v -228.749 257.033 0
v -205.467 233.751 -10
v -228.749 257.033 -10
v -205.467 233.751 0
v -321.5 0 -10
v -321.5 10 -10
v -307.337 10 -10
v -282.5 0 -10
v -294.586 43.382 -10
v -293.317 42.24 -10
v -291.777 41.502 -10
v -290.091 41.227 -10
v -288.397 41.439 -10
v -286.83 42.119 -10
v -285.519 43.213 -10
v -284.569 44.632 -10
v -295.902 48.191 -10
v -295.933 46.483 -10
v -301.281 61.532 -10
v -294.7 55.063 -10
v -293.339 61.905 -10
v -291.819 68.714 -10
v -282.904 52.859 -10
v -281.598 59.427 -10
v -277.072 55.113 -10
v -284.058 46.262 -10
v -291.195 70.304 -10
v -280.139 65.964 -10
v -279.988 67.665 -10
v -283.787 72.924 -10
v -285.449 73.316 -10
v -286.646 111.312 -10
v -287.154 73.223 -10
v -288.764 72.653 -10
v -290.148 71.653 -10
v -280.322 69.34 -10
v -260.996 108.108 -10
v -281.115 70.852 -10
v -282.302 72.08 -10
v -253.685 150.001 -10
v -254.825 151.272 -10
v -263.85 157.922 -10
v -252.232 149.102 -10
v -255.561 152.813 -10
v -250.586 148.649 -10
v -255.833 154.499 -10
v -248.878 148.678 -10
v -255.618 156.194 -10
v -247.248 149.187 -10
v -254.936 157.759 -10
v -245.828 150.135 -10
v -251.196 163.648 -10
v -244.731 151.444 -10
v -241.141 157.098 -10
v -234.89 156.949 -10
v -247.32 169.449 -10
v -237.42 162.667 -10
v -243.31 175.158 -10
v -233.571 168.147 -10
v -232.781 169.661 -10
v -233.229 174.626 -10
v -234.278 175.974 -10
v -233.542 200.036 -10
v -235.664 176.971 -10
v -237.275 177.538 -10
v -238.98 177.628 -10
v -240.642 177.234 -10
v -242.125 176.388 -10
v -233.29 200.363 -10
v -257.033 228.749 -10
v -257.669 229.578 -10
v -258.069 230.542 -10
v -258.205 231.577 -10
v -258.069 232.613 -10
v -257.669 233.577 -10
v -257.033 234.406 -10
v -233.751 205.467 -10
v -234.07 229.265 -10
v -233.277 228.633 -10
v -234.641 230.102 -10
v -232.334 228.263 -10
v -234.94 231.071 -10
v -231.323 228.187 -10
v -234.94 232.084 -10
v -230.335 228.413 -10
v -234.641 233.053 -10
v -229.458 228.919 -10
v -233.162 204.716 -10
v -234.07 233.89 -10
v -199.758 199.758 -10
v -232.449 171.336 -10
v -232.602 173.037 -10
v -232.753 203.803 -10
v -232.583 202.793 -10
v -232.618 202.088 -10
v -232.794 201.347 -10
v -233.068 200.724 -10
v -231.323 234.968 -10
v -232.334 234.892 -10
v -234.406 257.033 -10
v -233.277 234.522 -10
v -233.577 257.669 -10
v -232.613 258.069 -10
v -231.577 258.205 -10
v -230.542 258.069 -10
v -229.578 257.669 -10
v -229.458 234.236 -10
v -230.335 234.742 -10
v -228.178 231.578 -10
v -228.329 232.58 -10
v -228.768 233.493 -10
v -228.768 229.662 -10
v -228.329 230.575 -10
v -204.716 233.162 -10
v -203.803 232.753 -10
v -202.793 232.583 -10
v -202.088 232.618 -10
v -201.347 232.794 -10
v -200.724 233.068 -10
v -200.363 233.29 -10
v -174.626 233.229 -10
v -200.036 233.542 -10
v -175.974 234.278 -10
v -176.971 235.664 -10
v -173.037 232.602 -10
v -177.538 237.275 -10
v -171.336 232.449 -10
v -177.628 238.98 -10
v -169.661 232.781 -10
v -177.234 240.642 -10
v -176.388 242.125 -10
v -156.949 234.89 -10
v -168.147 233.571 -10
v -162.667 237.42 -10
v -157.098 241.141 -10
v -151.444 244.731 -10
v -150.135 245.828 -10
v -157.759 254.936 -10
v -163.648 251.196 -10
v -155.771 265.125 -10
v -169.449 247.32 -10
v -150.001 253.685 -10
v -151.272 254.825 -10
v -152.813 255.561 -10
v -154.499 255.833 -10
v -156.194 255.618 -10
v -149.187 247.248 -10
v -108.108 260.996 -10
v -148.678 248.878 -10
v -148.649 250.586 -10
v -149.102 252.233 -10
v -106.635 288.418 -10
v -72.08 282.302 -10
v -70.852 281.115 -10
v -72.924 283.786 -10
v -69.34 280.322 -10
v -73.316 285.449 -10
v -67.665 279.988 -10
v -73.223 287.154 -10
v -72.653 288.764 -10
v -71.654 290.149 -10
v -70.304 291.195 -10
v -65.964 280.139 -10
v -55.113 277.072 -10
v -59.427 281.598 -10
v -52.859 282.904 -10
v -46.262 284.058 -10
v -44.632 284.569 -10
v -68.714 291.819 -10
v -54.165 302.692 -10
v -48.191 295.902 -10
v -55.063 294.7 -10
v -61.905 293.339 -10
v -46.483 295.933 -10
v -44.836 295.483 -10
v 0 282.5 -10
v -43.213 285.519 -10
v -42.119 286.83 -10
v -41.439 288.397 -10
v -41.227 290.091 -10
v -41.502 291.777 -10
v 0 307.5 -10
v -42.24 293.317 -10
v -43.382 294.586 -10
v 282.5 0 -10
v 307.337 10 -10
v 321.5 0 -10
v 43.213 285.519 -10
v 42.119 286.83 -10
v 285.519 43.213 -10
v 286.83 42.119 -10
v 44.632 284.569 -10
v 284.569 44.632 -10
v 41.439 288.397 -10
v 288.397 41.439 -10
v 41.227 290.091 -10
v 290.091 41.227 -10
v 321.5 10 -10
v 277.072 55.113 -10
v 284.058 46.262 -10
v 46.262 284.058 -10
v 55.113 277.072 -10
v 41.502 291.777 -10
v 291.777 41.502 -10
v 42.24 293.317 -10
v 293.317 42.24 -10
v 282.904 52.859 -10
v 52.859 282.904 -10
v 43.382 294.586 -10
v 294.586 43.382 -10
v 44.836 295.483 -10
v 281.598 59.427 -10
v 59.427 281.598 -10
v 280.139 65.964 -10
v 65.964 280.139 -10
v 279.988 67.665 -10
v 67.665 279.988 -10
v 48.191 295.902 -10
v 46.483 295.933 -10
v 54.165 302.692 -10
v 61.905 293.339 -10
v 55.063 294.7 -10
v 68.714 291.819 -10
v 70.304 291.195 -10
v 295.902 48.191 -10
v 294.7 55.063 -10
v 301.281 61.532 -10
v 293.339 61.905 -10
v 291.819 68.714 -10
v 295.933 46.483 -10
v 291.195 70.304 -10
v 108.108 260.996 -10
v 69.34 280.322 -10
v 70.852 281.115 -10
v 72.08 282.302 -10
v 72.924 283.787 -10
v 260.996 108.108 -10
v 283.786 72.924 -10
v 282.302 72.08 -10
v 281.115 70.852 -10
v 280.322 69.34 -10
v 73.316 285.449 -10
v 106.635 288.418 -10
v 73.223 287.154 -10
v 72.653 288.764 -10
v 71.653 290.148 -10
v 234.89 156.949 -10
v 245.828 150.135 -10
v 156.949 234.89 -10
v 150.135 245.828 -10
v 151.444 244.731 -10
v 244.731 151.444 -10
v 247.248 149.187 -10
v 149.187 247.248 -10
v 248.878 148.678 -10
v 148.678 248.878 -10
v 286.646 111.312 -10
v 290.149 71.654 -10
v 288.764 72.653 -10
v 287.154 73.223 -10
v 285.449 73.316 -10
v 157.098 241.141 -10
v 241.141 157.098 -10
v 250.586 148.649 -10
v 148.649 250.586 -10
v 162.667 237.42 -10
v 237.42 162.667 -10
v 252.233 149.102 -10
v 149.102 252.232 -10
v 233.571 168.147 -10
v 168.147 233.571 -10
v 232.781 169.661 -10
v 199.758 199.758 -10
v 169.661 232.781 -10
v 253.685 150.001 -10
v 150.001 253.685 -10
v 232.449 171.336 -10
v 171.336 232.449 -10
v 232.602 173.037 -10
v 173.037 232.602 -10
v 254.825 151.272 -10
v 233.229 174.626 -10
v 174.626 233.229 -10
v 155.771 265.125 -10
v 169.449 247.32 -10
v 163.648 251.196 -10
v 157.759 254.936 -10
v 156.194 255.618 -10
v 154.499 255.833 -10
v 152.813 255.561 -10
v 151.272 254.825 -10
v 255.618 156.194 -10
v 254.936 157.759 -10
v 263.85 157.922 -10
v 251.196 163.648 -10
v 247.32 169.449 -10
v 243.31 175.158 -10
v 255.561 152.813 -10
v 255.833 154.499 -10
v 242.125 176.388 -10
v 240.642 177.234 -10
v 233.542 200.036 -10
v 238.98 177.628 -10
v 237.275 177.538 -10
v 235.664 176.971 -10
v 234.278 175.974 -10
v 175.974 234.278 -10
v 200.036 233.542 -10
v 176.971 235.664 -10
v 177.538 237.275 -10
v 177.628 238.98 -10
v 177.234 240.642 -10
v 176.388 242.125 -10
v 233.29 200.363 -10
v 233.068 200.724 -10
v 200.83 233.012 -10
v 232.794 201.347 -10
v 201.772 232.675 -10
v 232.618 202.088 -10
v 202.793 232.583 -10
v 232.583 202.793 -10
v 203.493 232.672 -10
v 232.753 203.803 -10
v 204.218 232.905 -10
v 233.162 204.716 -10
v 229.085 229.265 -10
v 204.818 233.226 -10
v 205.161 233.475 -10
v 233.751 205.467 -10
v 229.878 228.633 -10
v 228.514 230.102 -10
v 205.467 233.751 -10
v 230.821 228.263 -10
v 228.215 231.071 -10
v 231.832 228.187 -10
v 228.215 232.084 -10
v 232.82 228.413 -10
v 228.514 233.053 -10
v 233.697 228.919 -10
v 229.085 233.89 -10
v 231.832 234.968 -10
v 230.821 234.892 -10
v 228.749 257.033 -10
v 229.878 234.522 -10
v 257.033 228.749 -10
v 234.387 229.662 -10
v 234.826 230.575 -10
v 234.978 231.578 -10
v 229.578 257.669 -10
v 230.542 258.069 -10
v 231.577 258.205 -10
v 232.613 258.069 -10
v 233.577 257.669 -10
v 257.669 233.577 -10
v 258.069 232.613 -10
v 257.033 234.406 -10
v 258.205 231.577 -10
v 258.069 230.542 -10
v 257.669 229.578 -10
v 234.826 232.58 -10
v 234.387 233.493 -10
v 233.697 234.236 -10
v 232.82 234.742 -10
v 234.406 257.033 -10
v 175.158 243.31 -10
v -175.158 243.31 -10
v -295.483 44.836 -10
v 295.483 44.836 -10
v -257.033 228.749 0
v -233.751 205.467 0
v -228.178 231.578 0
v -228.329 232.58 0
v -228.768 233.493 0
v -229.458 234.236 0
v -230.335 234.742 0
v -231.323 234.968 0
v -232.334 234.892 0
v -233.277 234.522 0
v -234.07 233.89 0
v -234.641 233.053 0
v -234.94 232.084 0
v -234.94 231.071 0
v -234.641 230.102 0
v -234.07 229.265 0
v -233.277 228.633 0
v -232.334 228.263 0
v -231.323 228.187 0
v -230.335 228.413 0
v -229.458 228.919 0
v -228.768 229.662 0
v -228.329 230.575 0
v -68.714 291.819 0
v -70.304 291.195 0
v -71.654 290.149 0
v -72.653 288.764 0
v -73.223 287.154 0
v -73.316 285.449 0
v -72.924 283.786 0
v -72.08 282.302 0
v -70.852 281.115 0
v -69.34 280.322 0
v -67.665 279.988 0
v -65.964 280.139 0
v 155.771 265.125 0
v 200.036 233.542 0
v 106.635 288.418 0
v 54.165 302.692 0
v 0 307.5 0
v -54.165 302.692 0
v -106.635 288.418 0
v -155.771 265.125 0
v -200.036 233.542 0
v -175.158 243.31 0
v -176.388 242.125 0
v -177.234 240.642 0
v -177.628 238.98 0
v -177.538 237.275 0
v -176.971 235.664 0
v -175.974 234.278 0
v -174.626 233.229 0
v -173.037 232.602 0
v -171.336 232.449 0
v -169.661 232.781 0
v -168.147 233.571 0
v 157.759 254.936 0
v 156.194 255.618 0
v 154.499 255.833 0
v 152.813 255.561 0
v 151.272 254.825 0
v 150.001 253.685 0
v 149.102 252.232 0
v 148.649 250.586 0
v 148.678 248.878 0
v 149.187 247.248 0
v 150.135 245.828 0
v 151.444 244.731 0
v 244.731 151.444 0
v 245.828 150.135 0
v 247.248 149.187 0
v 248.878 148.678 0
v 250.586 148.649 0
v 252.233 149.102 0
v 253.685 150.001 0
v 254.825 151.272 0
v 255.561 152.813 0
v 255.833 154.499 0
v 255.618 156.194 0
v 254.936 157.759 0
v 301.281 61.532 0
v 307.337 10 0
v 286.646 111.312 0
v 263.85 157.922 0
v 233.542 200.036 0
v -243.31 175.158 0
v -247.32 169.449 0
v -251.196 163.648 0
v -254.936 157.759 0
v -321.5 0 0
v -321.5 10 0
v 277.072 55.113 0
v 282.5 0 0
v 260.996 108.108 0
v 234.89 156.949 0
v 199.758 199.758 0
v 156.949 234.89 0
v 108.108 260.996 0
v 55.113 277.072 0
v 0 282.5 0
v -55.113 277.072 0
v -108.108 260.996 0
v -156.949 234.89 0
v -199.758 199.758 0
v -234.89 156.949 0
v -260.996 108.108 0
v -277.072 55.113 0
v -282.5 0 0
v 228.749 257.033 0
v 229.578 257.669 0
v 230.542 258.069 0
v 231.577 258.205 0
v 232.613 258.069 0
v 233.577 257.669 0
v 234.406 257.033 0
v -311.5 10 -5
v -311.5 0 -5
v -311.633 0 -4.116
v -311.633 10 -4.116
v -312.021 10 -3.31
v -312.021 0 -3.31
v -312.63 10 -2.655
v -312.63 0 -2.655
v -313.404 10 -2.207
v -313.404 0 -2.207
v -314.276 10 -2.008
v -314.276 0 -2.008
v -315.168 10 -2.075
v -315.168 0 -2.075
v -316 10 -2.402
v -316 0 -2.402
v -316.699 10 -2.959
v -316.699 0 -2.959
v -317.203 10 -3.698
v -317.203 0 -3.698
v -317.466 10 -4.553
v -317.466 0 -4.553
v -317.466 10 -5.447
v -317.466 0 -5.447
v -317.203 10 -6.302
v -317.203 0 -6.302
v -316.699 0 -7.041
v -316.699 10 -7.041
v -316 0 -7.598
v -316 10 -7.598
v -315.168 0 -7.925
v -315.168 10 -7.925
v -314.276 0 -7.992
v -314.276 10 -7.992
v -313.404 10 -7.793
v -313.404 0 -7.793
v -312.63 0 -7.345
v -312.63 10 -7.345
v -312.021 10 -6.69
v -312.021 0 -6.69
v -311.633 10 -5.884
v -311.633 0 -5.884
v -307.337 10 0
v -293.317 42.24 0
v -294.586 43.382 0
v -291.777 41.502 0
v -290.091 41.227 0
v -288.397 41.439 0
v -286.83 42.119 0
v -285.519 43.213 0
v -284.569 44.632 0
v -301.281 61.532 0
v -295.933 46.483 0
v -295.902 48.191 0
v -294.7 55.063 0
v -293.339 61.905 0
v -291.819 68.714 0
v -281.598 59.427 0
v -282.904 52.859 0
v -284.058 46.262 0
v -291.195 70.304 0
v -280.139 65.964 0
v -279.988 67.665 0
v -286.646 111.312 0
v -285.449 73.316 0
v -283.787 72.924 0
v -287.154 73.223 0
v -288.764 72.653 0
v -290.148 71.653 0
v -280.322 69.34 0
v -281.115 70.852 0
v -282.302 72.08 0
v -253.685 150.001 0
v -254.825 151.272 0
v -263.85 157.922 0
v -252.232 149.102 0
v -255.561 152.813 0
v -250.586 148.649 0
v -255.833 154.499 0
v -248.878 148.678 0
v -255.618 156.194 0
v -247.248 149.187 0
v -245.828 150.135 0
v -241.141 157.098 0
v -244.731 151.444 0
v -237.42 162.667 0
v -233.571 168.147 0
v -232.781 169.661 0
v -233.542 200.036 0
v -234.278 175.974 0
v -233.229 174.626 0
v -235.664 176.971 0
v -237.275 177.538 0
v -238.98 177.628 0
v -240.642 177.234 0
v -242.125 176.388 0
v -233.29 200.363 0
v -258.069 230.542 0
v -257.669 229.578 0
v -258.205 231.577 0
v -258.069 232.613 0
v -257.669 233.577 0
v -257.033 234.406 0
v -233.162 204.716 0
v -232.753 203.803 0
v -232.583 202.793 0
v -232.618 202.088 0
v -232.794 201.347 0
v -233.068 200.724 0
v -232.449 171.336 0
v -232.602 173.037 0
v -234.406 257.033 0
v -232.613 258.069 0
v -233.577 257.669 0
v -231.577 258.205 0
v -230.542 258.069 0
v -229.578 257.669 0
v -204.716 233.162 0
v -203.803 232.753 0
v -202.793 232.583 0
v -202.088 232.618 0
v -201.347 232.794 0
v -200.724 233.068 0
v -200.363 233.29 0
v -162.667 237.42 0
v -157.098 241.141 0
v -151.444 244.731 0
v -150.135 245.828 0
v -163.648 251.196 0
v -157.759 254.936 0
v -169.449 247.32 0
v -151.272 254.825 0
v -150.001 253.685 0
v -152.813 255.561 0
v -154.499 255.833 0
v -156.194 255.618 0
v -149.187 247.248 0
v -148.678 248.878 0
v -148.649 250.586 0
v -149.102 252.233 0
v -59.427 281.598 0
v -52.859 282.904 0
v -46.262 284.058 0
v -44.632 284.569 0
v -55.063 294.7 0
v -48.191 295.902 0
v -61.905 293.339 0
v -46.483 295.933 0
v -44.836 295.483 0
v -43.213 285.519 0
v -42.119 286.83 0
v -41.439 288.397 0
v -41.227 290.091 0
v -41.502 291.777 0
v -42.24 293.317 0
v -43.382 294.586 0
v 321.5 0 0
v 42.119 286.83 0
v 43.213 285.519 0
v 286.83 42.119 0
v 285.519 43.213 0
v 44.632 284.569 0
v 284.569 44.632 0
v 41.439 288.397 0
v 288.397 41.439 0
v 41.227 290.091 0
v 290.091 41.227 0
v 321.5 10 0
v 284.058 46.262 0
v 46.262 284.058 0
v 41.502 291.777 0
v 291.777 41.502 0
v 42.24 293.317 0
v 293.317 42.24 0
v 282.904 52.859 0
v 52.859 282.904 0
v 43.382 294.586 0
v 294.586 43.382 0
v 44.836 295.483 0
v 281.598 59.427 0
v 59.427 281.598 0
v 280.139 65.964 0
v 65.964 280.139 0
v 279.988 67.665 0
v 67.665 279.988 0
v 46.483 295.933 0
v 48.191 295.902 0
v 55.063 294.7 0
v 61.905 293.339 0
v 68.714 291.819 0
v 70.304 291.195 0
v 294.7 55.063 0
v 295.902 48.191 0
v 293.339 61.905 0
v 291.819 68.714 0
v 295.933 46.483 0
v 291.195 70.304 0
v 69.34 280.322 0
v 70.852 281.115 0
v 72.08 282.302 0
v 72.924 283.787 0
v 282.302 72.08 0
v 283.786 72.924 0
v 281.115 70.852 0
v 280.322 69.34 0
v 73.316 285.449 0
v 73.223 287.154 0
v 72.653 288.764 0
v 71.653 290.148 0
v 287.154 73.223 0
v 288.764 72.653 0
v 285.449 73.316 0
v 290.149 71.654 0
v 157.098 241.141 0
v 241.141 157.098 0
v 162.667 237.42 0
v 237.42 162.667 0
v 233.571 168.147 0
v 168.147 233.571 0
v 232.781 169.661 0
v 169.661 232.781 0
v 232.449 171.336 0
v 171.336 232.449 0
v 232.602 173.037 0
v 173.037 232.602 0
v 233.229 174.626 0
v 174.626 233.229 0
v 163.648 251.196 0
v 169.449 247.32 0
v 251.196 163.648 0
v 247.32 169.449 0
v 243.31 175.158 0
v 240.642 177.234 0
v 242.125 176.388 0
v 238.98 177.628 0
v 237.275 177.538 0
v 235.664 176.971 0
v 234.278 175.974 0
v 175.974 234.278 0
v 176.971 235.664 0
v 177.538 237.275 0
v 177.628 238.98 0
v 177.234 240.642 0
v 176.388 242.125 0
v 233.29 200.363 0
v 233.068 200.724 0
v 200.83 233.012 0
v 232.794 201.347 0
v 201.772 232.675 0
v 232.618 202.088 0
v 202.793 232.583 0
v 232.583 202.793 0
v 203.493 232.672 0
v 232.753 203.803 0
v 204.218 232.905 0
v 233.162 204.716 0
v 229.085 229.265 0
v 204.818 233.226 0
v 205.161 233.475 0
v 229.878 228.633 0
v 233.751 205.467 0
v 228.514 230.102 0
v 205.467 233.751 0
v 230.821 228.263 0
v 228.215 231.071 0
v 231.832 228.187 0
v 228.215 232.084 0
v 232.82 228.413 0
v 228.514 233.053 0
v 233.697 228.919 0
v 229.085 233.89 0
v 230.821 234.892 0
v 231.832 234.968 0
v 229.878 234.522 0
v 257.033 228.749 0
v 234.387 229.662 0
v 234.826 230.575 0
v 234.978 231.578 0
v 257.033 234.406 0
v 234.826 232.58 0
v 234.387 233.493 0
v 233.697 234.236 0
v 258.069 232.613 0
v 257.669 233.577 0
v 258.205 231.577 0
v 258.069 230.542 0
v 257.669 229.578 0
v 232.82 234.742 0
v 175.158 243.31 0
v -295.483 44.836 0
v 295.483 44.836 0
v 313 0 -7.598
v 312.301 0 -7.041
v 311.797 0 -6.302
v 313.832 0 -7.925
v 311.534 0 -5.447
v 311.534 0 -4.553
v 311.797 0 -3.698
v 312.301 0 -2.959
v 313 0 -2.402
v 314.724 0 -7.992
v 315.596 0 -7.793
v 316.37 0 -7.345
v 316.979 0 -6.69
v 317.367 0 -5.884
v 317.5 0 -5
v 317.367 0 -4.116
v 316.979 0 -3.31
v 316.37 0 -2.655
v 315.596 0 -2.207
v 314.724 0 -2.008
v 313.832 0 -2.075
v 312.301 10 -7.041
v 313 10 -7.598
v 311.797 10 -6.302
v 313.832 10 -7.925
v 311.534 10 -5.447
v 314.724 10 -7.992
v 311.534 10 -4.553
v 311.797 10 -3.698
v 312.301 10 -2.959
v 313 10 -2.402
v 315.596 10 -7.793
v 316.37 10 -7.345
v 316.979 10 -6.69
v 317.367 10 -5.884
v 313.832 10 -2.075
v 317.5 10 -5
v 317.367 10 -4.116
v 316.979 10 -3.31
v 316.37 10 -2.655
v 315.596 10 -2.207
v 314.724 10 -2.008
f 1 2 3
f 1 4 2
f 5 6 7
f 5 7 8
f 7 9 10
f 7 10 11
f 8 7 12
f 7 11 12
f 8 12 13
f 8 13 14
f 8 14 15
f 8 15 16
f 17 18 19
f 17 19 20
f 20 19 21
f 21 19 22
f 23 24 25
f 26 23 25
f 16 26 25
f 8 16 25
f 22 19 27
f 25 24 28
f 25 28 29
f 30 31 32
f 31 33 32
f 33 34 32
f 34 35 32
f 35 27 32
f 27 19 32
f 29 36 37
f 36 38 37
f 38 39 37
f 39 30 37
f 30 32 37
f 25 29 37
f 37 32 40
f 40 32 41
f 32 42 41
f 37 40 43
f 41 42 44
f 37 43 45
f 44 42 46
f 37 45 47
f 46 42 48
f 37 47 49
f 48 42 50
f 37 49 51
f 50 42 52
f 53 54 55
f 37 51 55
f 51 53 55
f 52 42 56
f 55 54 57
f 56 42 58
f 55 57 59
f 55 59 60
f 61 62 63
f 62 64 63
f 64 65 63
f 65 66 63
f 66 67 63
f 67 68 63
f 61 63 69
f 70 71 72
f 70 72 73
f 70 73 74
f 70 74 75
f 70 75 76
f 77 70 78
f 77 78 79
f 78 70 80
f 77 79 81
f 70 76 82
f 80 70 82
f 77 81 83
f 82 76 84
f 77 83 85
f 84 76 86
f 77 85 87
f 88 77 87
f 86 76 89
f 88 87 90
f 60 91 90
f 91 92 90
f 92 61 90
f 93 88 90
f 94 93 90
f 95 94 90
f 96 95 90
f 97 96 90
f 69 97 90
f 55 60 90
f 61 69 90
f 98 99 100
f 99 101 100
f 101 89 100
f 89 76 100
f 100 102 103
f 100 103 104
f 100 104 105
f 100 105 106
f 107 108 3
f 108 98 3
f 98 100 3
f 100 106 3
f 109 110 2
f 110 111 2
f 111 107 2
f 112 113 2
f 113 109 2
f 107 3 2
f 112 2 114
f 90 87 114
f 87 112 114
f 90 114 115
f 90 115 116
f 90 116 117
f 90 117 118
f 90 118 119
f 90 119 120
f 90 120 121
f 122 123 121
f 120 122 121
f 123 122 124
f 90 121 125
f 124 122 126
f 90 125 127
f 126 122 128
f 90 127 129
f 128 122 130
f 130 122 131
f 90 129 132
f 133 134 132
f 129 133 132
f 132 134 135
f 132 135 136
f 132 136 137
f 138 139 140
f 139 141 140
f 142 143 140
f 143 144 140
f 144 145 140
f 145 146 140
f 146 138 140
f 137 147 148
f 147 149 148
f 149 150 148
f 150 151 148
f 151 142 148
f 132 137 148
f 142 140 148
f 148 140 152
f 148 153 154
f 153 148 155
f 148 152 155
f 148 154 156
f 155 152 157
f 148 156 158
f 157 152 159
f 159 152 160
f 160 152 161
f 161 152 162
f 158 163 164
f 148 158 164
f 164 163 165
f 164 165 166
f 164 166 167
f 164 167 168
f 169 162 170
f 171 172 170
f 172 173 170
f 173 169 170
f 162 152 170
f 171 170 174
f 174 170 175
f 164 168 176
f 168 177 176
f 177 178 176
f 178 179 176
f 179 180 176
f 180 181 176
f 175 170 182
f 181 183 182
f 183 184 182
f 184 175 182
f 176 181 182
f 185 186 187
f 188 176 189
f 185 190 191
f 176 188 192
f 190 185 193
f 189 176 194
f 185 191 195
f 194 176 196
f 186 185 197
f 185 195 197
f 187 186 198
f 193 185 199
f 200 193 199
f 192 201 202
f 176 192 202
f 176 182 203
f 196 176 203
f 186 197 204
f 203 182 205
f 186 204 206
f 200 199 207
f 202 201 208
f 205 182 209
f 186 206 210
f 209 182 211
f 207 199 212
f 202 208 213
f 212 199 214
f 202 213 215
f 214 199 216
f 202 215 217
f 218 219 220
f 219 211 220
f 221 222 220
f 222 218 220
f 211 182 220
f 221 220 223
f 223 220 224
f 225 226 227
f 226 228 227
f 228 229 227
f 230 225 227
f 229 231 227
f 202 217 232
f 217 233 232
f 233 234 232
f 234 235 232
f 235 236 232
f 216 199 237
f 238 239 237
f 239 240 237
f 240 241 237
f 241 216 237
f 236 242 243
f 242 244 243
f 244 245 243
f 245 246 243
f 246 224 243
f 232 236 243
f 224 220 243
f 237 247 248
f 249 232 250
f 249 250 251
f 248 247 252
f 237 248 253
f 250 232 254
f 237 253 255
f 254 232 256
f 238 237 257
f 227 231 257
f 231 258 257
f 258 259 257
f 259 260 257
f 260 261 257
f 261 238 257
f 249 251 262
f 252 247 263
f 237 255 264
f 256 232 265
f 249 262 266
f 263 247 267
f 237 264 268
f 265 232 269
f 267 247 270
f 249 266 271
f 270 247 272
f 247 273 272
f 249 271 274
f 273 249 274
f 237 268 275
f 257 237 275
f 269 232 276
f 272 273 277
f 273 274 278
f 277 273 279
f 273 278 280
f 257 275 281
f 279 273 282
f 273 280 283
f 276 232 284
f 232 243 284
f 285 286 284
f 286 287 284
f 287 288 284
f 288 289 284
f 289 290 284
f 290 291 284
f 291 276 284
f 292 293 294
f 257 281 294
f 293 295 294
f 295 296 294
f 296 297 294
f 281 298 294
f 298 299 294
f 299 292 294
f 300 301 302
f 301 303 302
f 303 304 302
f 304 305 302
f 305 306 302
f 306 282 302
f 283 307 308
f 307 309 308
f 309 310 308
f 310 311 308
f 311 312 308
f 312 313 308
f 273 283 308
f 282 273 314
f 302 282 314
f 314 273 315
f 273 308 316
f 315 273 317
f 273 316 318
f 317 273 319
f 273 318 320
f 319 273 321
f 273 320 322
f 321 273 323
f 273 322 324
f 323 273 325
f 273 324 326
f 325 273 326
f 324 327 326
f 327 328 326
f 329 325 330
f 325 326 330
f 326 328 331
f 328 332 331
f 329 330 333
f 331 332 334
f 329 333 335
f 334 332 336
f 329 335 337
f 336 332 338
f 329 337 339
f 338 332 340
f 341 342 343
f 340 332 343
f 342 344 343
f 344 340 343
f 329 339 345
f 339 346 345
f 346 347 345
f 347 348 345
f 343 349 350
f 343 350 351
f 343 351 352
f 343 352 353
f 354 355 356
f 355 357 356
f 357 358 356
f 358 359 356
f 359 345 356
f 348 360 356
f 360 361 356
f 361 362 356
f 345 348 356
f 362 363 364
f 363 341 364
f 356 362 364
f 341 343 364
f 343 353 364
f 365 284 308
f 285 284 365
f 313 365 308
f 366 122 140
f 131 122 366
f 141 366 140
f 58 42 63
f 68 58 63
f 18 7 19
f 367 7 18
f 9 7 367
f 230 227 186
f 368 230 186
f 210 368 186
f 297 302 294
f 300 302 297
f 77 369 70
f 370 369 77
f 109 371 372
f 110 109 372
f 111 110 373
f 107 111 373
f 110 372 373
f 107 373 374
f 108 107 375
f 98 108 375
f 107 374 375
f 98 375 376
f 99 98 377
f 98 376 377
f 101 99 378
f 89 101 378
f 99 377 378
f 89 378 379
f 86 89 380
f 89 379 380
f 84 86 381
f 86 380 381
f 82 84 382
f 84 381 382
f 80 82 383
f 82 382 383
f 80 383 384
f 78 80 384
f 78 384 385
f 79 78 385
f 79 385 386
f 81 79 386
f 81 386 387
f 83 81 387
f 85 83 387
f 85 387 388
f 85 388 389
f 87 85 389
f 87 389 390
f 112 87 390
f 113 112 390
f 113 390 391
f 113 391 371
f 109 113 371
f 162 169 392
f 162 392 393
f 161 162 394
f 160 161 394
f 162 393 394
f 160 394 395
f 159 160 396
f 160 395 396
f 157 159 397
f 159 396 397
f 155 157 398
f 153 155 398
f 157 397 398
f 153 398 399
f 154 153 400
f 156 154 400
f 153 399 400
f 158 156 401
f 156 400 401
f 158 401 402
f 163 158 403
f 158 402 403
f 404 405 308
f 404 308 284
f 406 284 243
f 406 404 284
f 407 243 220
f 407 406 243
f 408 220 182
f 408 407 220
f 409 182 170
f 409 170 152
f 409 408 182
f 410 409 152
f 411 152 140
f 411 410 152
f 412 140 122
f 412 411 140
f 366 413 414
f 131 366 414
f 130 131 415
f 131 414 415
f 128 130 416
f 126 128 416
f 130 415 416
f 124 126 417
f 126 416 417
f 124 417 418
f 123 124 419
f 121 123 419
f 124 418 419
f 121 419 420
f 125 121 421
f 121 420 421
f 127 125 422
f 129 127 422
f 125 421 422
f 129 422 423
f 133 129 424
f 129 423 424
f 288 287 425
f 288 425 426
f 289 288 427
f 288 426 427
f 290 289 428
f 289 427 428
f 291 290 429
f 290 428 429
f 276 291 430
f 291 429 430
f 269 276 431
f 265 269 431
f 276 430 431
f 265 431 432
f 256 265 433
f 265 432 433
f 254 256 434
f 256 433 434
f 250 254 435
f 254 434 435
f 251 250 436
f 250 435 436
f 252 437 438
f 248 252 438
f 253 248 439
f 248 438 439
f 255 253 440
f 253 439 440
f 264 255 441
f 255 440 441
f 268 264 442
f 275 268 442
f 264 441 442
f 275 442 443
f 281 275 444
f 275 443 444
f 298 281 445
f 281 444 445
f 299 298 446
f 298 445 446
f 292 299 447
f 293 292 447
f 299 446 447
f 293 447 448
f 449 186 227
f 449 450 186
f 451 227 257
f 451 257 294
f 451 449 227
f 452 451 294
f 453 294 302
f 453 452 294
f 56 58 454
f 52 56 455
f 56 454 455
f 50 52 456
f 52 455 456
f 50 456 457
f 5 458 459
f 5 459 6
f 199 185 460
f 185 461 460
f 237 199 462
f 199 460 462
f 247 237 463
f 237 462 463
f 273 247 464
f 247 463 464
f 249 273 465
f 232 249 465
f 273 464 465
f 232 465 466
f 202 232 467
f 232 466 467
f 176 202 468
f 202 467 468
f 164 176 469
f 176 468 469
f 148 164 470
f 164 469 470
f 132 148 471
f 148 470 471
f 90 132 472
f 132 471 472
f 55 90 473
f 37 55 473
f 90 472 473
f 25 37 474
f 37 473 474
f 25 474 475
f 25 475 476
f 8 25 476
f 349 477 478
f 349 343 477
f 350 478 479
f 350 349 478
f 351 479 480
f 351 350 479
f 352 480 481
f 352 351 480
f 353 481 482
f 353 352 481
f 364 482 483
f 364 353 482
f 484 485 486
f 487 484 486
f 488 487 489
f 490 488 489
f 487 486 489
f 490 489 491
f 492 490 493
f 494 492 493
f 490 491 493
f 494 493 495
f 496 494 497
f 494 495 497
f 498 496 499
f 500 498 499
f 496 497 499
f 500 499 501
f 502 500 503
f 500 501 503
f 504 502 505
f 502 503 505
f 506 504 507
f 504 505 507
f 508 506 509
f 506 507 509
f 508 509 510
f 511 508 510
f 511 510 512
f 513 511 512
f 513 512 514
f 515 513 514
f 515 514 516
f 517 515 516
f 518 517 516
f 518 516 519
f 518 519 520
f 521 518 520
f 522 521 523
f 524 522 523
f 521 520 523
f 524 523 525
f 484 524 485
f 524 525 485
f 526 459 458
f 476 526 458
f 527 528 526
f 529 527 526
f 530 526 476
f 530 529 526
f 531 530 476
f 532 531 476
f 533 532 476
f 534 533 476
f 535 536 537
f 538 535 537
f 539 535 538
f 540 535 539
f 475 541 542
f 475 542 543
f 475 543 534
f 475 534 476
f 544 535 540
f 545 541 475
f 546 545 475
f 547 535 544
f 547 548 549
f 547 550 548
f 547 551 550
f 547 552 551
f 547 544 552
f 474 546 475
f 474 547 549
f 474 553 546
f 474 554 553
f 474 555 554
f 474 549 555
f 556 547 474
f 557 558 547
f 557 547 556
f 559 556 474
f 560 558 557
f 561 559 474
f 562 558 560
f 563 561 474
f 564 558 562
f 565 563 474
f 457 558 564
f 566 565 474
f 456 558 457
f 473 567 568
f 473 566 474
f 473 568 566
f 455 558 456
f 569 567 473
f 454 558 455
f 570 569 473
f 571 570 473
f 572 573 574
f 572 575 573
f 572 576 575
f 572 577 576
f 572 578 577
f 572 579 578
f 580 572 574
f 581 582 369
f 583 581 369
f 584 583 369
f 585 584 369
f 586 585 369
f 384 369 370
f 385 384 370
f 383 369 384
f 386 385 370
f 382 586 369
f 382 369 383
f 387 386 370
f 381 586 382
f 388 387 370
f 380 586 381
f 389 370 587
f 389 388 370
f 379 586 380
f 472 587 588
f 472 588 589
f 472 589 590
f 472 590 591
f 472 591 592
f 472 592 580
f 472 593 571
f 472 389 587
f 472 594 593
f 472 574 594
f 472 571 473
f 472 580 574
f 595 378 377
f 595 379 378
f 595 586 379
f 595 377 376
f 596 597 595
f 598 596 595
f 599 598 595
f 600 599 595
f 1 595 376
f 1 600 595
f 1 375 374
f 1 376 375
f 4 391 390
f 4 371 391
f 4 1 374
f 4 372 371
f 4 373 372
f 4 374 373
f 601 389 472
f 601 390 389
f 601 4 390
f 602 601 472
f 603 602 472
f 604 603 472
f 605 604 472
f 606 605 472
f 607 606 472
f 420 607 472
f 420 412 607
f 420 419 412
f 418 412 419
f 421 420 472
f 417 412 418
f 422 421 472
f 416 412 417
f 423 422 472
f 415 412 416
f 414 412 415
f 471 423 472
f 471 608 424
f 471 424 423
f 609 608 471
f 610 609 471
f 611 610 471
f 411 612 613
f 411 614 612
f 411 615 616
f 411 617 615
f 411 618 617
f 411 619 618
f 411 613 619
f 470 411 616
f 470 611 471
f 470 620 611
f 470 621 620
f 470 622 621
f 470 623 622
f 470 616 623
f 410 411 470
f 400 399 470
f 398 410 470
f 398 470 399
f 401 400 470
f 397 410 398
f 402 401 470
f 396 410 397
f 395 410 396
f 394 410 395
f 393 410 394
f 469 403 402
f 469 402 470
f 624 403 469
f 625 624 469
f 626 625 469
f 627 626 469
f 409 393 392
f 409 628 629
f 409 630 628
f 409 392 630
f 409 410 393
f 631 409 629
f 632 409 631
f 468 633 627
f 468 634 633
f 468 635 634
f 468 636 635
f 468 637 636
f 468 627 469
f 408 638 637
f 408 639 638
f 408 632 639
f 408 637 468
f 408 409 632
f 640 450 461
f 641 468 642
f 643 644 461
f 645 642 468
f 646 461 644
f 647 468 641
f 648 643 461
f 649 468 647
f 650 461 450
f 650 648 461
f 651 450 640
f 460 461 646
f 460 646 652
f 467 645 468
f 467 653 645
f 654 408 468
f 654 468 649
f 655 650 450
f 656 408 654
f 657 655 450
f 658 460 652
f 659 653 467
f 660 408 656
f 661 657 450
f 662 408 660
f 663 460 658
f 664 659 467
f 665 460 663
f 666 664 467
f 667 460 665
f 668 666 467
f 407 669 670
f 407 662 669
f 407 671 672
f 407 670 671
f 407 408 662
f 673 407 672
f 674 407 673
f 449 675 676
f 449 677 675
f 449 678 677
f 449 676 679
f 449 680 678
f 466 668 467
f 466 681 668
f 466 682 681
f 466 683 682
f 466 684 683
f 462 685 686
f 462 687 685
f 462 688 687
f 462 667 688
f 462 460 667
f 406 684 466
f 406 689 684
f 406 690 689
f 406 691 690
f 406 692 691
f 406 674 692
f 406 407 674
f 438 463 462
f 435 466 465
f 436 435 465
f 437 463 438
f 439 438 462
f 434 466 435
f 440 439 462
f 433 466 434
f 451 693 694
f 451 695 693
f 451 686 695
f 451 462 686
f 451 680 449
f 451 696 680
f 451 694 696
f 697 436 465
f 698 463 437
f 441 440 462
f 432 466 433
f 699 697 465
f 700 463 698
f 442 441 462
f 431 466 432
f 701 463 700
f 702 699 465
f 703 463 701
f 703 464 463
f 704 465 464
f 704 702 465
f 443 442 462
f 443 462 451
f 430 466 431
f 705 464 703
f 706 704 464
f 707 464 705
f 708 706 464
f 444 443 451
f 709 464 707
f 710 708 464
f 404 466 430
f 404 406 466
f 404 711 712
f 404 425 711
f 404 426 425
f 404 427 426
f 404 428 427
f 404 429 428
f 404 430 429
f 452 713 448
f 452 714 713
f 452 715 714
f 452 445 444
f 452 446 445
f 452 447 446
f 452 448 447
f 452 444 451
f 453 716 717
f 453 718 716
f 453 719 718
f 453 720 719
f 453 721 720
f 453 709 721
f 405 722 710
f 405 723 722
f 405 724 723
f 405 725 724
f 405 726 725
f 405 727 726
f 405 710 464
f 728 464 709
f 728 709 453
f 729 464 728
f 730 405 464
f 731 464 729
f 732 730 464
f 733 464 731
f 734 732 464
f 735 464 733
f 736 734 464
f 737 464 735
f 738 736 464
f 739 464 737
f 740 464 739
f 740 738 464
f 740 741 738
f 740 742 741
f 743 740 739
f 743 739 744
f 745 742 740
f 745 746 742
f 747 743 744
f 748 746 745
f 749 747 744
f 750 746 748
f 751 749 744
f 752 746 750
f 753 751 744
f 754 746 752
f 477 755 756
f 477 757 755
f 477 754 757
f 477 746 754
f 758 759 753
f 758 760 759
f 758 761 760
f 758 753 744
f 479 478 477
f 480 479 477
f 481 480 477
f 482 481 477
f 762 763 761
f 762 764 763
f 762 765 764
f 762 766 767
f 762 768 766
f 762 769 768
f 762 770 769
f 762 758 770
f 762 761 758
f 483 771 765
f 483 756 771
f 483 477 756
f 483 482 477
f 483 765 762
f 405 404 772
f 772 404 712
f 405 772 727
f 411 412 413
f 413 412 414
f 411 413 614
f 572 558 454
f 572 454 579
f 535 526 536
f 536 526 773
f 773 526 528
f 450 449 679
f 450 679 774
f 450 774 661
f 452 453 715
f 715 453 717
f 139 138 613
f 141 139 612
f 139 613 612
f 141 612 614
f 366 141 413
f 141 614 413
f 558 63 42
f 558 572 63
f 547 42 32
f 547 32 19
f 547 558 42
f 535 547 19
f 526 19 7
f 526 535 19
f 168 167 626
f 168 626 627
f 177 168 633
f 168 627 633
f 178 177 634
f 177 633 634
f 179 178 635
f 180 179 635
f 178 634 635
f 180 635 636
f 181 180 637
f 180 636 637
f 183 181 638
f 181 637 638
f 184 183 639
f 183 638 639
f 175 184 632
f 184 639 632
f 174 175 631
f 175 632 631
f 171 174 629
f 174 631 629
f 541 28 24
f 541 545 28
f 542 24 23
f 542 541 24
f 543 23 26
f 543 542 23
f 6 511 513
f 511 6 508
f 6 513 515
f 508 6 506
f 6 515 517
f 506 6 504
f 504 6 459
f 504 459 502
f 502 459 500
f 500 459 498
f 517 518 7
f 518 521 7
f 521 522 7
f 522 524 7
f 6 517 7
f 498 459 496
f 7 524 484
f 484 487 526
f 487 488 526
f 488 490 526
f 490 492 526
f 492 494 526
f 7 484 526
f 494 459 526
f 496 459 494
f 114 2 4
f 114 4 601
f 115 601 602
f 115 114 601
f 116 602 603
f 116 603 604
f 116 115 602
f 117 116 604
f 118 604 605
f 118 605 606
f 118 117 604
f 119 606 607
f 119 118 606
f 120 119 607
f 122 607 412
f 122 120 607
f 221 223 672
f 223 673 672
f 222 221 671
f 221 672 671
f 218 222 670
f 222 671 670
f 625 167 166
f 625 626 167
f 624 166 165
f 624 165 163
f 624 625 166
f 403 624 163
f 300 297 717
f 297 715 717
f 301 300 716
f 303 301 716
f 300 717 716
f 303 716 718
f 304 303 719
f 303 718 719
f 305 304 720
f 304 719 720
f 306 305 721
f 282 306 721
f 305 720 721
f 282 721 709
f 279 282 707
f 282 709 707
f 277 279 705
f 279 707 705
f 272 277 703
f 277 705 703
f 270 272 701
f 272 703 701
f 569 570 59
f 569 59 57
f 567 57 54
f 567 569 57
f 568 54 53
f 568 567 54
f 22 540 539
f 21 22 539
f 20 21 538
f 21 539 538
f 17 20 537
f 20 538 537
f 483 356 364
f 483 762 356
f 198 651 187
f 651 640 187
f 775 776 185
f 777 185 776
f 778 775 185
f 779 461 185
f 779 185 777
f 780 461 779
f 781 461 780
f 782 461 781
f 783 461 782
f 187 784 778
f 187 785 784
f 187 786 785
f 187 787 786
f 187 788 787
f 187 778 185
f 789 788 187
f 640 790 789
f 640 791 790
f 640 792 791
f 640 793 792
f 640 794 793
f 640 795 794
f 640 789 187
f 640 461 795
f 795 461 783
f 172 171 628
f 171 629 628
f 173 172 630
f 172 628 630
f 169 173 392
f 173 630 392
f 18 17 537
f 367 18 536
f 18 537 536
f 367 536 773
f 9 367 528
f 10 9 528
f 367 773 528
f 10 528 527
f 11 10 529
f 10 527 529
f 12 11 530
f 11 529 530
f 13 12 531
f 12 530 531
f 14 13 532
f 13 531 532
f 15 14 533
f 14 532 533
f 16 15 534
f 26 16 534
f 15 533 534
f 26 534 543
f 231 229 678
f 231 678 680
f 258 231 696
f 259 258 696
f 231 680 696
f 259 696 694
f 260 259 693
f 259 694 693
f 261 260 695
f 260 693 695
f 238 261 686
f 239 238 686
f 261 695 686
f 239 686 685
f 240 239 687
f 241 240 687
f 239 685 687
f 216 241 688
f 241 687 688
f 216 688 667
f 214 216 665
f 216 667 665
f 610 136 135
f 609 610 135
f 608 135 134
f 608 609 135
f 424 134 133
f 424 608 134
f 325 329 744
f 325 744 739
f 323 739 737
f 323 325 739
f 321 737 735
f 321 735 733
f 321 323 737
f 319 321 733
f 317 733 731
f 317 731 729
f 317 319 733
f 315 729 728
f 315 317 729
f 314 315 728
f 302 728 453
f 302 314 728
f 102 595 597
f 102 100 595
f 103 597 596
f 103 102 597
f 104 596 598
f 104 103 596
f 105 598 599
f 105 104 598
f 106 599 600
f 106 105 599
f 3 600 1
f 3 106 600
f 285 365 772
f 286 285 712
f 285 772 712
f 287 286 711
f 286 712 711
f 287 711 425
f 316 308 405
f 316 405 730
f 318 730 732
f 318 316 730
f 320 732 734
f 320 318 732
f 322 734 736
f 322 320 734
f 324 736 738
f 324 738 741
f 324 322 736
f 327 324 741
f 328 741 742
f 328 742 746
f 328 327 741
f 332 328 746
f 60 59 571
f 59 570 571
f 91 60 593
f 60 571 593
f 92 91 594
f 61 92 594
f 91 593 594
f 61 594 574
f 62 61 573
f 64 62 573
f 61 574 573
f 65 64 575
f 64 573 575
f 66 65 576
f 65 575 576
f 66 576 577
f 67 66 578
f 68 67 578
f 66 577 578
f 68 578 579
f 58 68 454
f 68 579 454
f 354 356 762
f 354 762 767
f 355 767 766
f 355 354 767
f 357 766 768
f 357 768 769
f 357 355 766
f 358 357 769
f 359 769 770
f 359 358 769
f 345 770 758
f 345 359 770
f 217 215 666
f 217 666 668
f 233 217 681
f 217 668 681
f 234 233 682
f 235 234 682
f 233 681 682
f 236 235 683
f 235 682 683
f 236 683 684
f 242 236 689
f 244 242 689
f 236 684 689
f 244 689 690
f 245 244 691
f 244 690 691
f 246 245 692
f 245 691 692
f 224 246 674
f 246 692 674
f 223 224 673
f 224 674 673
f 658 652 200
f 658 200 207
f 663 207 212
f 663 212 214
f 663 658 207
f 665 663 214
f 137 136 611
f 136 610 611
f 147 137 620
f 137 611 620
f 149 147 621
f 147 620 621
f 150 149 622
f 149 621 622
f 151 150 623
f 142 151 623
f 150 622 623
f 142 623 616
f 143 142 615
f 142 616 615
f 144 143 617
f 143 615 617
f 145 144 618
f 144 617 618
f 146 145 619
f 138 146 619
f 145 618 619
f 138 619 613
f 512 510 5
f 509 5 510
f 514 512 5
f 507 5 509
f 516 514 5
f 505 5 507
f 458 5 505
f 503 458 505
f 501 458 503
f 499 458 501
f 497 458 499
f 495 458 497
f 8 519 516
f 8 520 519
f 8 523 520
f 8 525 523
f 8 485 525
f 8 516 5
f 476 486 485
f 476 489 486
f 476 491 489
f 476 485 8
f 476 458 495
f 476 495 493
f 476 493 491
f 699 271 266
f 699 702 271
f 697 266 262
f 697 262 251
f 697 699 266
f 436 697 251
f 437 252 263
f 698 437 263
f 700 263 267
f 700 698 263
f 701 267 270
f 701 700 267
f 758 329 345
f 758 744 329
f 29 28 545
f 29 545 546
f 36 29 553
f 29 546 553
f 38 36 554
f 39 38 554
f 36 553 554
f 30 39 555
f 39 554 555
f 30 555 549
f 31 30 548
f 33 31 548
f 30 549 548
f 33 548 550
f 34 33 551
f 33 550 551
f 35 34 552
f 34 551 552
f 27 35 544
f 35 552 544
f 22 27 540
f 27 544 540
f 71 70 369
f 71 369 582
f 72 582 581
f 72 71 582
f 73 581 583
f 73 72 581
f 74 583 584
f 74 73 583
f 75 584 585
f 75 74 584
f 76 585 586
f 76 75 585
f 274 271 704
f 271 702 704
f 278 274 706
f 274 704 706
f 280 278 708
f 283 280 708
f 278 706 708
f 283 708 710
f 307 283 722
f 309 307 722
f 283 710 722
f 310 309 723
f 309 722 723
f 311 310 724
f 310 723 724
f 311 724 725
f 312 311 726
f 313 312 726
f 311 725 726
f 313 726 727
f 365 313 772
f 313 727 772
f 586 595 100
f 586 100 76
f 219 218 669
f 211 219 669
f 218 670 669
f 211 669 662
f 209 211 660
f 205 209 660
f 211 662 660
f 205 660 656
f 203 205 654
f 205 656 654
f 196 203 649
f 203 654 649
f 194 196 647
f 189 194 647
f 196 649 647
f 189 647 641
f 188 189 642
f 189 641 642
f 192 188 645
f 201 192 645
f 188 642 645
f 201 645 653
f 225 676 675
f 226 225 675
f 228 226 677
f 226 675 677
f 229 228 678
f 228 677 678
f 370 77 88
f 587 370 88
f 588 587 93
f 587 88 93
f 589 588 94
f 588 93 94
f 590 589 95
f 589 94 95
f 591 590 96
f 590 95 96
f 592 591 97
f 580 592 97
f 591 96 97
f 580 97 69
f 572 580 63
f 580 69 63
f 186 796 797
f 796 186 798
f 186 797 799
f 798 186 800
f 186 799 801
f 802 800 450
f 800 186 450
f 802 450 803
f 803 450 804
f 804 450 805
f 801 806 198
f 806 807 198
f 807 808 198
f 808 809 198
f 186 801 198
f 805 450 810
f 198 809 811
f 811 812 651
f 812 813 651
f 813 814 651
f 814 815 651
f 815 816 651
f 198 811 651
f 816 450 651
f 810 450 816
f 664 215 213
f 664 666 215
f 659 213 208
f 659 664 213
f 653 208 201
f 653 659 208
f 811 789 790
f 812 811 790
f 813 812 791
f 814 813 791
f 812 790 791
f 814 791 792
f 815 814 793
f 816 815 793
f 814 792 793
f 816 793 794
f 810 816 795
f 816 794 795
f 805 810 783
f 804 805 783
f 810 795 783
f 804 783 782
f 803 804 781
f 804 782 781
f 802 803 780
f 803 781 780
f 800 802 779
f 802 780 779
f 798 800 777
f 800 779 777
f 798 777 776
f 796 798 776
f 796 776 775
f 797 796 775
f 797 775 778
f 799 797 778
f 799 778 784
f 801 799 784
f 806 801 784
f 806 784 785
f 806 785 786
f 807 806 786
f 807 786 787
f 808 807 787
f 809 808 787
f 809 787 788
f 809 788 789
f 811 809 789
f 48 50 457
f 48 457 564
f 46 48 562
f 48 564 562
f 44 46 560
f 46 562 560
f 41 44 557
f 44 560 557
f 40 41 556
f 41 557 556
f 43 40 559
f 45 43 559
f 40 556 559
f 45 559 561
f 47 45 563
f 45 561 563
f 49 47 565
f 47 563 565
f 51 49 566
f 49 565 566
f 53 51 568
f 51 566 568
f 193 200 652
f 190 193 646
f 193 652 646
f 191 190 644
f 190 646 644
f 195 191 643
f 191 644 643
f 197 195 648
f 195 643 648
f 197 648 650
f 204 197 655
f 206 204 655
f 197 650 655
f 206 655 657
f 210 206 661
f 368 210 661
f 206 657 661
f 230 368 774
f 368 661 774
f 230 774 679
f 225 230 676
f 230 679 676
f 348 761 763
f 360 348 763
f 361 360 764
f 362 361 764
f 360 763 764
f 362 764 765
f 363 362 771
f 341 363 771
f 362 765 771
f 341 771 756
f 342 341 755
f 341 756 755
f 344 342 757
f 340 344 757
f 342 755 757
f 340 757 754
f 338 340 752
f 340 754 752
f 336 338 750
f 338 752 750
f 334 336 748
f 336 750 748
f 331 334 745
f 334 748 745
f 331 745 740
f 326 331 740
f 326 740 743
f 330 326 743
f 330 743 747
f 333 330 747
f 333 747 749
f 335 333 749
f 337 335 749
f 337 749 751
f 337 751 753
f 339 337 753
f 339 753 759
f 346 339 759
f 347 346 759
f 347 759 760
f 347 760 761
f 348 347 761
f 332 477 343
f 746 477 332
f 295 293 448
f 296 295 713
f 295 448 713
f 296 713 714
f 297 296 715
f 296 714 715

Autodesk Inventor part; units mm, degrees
ref_plane "YZ Plane" through (0, 0, 0) normal (1, 0, 0) x (0, 1, 0)
ref_plane "XZ Plane" through (0, 0, 0) normal (0, 1, 0) x (-1, 0, 0)
ref_plane "XY Plane" through (0, 0, 0) normal (0, 0, 1) x (1, 0, 0)
sketch "Sketch7" plane through (0, 0, 0) normal (0, 0, 1) x (1, 0, 0)
  circle A0 centre (-231.5775, 231.5775) radius 3.4
  line L0 (-231.5775, 203.2932) -> (-203.2932, 231.5775)
  line L1 (-203.2932, 231.5775) -> (-231.5775, 259.8617)
  line L2 (-231.5775, 259.8617) -> (-259.8617, 231.5775)
  line L3 (-259.8617, 231.5775) -> (-231.5775, 203.2932)
  line L4 (-231.5775, 203.2932) -> (-231.5775, 259.8617) construction
  line L5 (-203.2932, 231.5775) -> (-259.8617, 231.5775) construction
  line L6 (-231.5775, 203.2932) -> (-191.5775, 203.2932) construction
  arc A1 (289.9795, 47.2262) -> (285.9788, 67.3391) centre (0, 0) ccw construction
  arc A2 (295.9015, 48.1906) -> (291.8191, 68.7143) centre (0, 0) ccw
  arc A3 (284.0576, 46.2617) -> (280.1386, 65.9639) centre (0, 0) ccw
  arc A4 (284.0576, 46.2617) -> (295.9015, 48.1906) centre (289.9795, 47.2262) ccw
  arc A5 (291.8191, 68.7143) -> (280.1386, 65.9639) centre (285.9788, 67.3391) ccw
  line L7 (0, 0) -> (289.9795, 47.2262) construction
  line L8 (0, 0) -> (293.8, 0) construction
  line L9 (0, 0) -> (285.9788, 67.3391) construction
  circle A6 centre (0, 0) radius 307.5
  circle A7 centre (0, 0) radius 282.5
  line L10 (-203.2932, 231.5775) -> (-185.1143, 213.3986)
  line L11 (-231.5775, 203.2932) -> (-213.3986, 185.1143)
  line L12 (-307.5, 0) -> (0, 0)
  line L13 (0, 0) -> (307.5, 0)
  line L14 (-231.5775, -203.2932) -> (-259.8617, -231.5775)
  line L15 (-259.8617, -231.5775) -> (-231.5775, -259.8617)
  circle A8 centre (-231.5775, -231.5775) radius 3.4
  line L16 (-231.5775, -259.8617) -> (-203.2932, -231.5775)
  line L17 (-203.2932, -231.5775) -> (-231.5775, -203.2932)
  line L18 (-203.2932, -231.5775) -> (-185.1143, -213.3986)
  line L19 (-231.5775, -203.2932) -> (-213.3986, -185.1143)
  line L20 (203.2932, -231.5775) -> (231.5775, -259.8617)
  line L21 (231.5775, -259.8617) -> (259.8617, -231.5775)
  circle A9 centre (231.5775, -231.5775) radius 3.4
  line L22 (259.8617, -231.5775) -> (231.5775, -203.2932)
  line L23 (231.5775, -203.2932) -> (203.2932, -231.5775)
  line L24 (231.5775, -203.2932) -> (213.3986, -185.1143)
  line L25 (203.2932, -231.5775) -> (185.1143, -213.3986)
  line L26 (231.5775, 203.2932) -> (259.8617, 231.5775)
  line L27 (259.8617, 231.5775) -> (231.5775, 259.8617)
  circle A10 centre (231.5775, 231.5775) radius 3.4
  line L28 (231.5775, 259.8617) -> (203.2932, 231.5775)
  line L29 (203.2932, 231.5775) -> (231.5775, 203.2932)
  line L30 (203.2932, 231.5775) -> (185.1143, 213.3986)
  line L31 (231.5775, 203.2932) -> (213.3986, 185.1143)
  arc A11 (254.9356, 157.7589) -> (243.3099, 175.158) centre (0, 0) ccw
  arc A12 (243.3099, 175.158) -> (233.571, 168.1471) centre (238.4404, 171.6526) ccw
  arc A13 (244.7314, 151.4444) -> (233.571, 168.1471) centre (0, 0) ccw
  arc A14 (244.7314, 151.4444) -> (254.9356, 157.7589) centre (249.8335, 154.6017) ccw
  arc A15 (175.158, 243.3099) -> (157.7589, 254.9356) centre (0, 0) ccw
  arc A16 (157.7589, 254.9356) -> (151.4444, 244.7314) centre (154.6017, 249.8335) ccw
  arc A17 (168.1471, 233.571) -> (151.4444, 244.7314) centre (0, 0) ccw
  arc A18 (168.1471, 233.571) -> (175.158, 243.3099) centre (171.6526, 238.4404) ccw
  arc A19 (68.7143, 291.8191) -> (48.1906, 295.9015) centre (0, 0) ccw
  arc A20 (48.1906, 295.9015) -> (46.2617, 284.0576) centre (47.2262, 289.9795) ccw
  arc A21 (65.9639, 280.1386) -> (46.2617, 284.0576) centre (0, 0) ccw
  arc A22 (65.9639, 280.1386) -> (68.7143, 291.8191) centre (67.3391, 285.9788) ccw
  arc A23 (-48.1906, 295.9015) -> (-68.7143, 291.8191) centre (0, 0) ccw
  arc A24 (-68.7143, 291.8191) -> (-65.9639, 280.1386) centre (-67.3391, 285.9788) ccw
  arc A25 (-46.2617, 284.0576) -> (-65.9639, 280.1386) centre (0, 0) ccw
  arc A26 (-46.2617, 284.0576) -> (-48.1906, 295.9015) centre (-47.2262, 289.9795) ccw
  arc A27 (-157.7589, 254.9356) -> (-175.158, 243.3099) centre (0, 0) ccw
  arc A28 (-175.158, 243.3099) -> (-168.1471, 233.571) centre (-171.6526, 238.4404) ccw
  arc A29 (-151.4444, 244.7314) -> (-168.1471, 233.571) centre (0, 0) ccw
  arc A30 (-151.4444, 244.7314) -> (-157.7589, 254.9356) centre (-154.6017, 249.8335) ccw
  arc A31 (-243.3099, 175.158) -> (-254.9356, 157.7589) centre (0, 0) ccw
  arc A32 (-254.9356, 157.7589) -> (-244.7314, 151.4444) centre (-249.8335, 154.6017) ccw
  arc A33 (-233.571, 168.1471) -> (-244.7314, 151.4444) centre (0, 0) ccw
  arc A34 (-233.571, 168.1471) -> (-243.3099, 175.158) centre (-238.4404, 171.6526) ccw
  arc A35 (-291.8191, 68.7143) -> (-295.9015, 48.1906) centre (0, 0) ccw
  arc A36 (-295.9015, 48.1906) -> (-284.0576, 46.2617) centre (-289.9795, 47.2262) ccw
  arc A37 (-280.1386, 65.9639) -> (-284.0576, 46.2617) centre (0, 0) ccw
  arc A38 (-280.1386, 65.9639) -> (-291.8191, 68.7143) centre (-285.9788, 67.3391) ccw
  arc A39 (-295.9015, -48.1906) -> (-291.8191, -68.7143) centre (0, 0) ccw
  arc A40 (-291.8191, -68.7143) -> (-280.1386, -65.9639) centre (-285.9788, -67.3391) ccw
  arc A41 (-284.0576, -46.2617) -> (-280.1386, -65.9639) centre (0, 0) ccw
  arc A42 (-284.0576, -46.2617) -> (-295.9015, -48.1906) centre (-289.9795, -47.2262) ccw
  arc A43 (-254.9356, -157.7589) -> (-243.3099, -175.158) centre (0, 0) ccw
  arc A44 (-243.3099, -175.158) -> (-233.571, -168.1471) centre (-238.4404, -171.6526) ccw
  arc A45 (-244.7314, -151.4444) -> (-233.571, -168.1471) centre (0, 0) ccw
  arc A46 (-244.7314, -151.4444) -> (-254.9356, -157.7589) centre (-249.8335, -154.6017) ccw
  arc A47 (-175.158, -243.3099) -> (-157.7589, -254.9356) centre (0, 0) ccw
  arc A48 (-157.7589, -254.9356) -> (-151.4444, -244.7314) centre (-154.6017, -249.8335) ccw
  arc A49 (-168.1471, -233.571) -> (-151.4444, -244.7314) centre (0, 0) ccw
  arc A50 (-168.1471, -233.571) -> (-175.158, -243.3099) centre (-171.6526, -238.4404) ccw
  arc A51 (-68.7143, -291.8191) -> (-48.1906, -295.9015) centre (0, 0) ccw
  arc A52 (-48.1906, -295.9015) -> (-46.2617, -284.0576) centre (-47.2262, -289.9795) ccw
  arc A53 (-65.9639, -280.1386) -> (-46.2617, -284.0576) centre (0, 0) ccw
  arc A54 (-65.9639, -280.1386) -> (-68.7143, -291.8191) centre (-67.3391, -285.9788) ccw
  arc A55 (48.1906, -295.9015) -> (68.7143, -291.8191) centre (0, 0) ccw
  arc A56 (68.7143, -291.8191) -> (65.9639, -280.1386) centre (67.3391, -285.9788) ccw
  arc A57 (46.2617, -284.0576) -> (65.9639, -280.1386) centre (0, 0) ccw
  arc A58 (46.2617, -284.0576) -> (48.1906, -295.9015) centre (47.2262, -289.9795) ccw
  arc A59 (157.7589, -254.9356) -> (175.158, -243.3099) centre (0, 0) ccw
  arc A60 (175.158, -243.3099) -> (168.1471, -233.571) centre (171.6526, -238.4404) ccw
  arc A61 (151.4444, -244.7314) -> (168.1471, -233.571) centre (0, 0) ccw
  arc A62 (151.4444, -244.7314) -> (157.7589, -254.9356) centre (154.6017, -249.8335) ccw
  arc A63 (243.3099, -175.158) -> (254.9356, -157.7589) centre (0, 0) ccw
  arc A64 (254.9356, -157.7589) -> (244.7314, -151.4444) centre (249.8335, -154.6017) ccw
  arc A65 (233.571, -168.1471) -> (244.7314, -151.4444) centre (0, 0) ccw
  arc A66 (233.571, -168.1471) -> (243.3099, -175.158) centre (238.4404, -171.6526) ccw
  arc A67 (291.8191, -68.7143) -> (295.9015, -48.1906) centre (0, 0) ccw
  arc A68 (295.9015, -48.1906) -> (284.0576, -46.2617) centre (289.9795, -47.2262) ccw
  arc A69 (280.1386, -65.9639) -> (284.0576, -46.2617) centre (0, 0) ccw
  arc A70 (280.1386, -65.9639) -> (291.8191, -68.7143) centre (285.9788, -67.3391) ccw
  point P0 (-202.8328, 231.1171)
  point P1 (-231.1171, 202.8328)
  point P2 (-282.5, 0)
  point P3 (282.5, 0)
  point P4 (231.1171, 202.8328)
  point P5 (202.8328, 231.1171)
  dimension "d131" = 6.8
  dimension "d132" = 231.5775
  dimension "d133" = 231.5775
  dimension "d135" = 45
  dimension "d137" = 40
  dimension "d138" = 40
  dimension "d144" = 293.8
  dimension "d145" = 9.25
  dimension "d146" = 4
  dimension "d147" = 12
  dimension "d148" = 615
  dimension "d149" = 565
  dimension "d152" = 360
  dimension "d156" = 360
extrude "Extrusion11" add sketch "Sketch7" against normal blind 10 contours L3 L2 L1 L0 | L0 A6 L11 | L0 L10 A6 | A6 L10 A7 L11 | L11 A7 L12 A6 | A6 L30 A7 L10 | L30 L29 A6 | A6 L31 A7 L30 | L29 L31 A6 | L29 L28 L27 L26 | A6 L13 A7 L31
sketch "Sketch8" plane through (-307.5, 0, 0) normal (0, -1, 0) x (1, 0, 0)
  line L0 (25, 0) -> (590, 0) projected
  line L1 (25, 0) -> (-14, 0)
  line L2 (-14, 0) -> (-14, -10)
  line L3 (-14, -10) -> (25, -10)
  line L4 (25, -10) -> (25, 0)
  circle A0 centre (-7, -5) radius 3
  line L5 (590, 0) -> (629, 0)
  line L6 (629, 0) -> (629, -10)
  line L7 (629, -10) -> (590, -10)
  line L8 (590, -10) -> (590, 0)
  circle A1 centre (622, -5) radius 3
  dimension "d160" = 39
  dimension "d161" = 10
  dimension "d162" = 6
  dimension "d163" = 5
  dimension "d164" = 7
  dimension "d165" = 39
  dimension "d166" = 10
  dimension "d167" = 6
  dimension "d168" = 7
  dimension "d169" = 5
extrude "Extrusion12" add sketch "Sketch8" against normal blind 10
fillet "Fillet4" radius 4 8 edges at (-231.1171, 202.8328, -5) (-259.8617, 231.5775, -5) (-202.8328, 231.1171, -5) (-231.5775, 259.8617, -5) (231.5775, 259.8617, -5) (259.8617, 231.5775, -5) (202.8328, 231.1171, -5) (231.1171, 202.8328, -5)
equation "\"bar_screw_hole_diam\" = 6.8"
equation "\"foot_length\" = 14"
equation "\"tube_rim_diam\" = 605"
equation "\"tube_inner_diam\" = 541"
equation "\"tube_outer_diam\" = 561"
equation "\"ring_delta\" = 2"
equation "\"bar_delta\" = 5"
equation "\"bar_circle_diam\" = 655"
equation "\"ring_inner_diam\" = 565"
equation "\"ring_outer_diam\" = 615"
equation "\"slot_angle\" = 9.25deg"
equation "\"slot_diam\" = 12"
equation "\"slots_circle_diam\" = 587.6"
equation "\"foot_screw_diam\" = 6"
equation "\"bar_fillet\" = 4"
properties part number "half_ring_1" material "Aluminum 6061"
